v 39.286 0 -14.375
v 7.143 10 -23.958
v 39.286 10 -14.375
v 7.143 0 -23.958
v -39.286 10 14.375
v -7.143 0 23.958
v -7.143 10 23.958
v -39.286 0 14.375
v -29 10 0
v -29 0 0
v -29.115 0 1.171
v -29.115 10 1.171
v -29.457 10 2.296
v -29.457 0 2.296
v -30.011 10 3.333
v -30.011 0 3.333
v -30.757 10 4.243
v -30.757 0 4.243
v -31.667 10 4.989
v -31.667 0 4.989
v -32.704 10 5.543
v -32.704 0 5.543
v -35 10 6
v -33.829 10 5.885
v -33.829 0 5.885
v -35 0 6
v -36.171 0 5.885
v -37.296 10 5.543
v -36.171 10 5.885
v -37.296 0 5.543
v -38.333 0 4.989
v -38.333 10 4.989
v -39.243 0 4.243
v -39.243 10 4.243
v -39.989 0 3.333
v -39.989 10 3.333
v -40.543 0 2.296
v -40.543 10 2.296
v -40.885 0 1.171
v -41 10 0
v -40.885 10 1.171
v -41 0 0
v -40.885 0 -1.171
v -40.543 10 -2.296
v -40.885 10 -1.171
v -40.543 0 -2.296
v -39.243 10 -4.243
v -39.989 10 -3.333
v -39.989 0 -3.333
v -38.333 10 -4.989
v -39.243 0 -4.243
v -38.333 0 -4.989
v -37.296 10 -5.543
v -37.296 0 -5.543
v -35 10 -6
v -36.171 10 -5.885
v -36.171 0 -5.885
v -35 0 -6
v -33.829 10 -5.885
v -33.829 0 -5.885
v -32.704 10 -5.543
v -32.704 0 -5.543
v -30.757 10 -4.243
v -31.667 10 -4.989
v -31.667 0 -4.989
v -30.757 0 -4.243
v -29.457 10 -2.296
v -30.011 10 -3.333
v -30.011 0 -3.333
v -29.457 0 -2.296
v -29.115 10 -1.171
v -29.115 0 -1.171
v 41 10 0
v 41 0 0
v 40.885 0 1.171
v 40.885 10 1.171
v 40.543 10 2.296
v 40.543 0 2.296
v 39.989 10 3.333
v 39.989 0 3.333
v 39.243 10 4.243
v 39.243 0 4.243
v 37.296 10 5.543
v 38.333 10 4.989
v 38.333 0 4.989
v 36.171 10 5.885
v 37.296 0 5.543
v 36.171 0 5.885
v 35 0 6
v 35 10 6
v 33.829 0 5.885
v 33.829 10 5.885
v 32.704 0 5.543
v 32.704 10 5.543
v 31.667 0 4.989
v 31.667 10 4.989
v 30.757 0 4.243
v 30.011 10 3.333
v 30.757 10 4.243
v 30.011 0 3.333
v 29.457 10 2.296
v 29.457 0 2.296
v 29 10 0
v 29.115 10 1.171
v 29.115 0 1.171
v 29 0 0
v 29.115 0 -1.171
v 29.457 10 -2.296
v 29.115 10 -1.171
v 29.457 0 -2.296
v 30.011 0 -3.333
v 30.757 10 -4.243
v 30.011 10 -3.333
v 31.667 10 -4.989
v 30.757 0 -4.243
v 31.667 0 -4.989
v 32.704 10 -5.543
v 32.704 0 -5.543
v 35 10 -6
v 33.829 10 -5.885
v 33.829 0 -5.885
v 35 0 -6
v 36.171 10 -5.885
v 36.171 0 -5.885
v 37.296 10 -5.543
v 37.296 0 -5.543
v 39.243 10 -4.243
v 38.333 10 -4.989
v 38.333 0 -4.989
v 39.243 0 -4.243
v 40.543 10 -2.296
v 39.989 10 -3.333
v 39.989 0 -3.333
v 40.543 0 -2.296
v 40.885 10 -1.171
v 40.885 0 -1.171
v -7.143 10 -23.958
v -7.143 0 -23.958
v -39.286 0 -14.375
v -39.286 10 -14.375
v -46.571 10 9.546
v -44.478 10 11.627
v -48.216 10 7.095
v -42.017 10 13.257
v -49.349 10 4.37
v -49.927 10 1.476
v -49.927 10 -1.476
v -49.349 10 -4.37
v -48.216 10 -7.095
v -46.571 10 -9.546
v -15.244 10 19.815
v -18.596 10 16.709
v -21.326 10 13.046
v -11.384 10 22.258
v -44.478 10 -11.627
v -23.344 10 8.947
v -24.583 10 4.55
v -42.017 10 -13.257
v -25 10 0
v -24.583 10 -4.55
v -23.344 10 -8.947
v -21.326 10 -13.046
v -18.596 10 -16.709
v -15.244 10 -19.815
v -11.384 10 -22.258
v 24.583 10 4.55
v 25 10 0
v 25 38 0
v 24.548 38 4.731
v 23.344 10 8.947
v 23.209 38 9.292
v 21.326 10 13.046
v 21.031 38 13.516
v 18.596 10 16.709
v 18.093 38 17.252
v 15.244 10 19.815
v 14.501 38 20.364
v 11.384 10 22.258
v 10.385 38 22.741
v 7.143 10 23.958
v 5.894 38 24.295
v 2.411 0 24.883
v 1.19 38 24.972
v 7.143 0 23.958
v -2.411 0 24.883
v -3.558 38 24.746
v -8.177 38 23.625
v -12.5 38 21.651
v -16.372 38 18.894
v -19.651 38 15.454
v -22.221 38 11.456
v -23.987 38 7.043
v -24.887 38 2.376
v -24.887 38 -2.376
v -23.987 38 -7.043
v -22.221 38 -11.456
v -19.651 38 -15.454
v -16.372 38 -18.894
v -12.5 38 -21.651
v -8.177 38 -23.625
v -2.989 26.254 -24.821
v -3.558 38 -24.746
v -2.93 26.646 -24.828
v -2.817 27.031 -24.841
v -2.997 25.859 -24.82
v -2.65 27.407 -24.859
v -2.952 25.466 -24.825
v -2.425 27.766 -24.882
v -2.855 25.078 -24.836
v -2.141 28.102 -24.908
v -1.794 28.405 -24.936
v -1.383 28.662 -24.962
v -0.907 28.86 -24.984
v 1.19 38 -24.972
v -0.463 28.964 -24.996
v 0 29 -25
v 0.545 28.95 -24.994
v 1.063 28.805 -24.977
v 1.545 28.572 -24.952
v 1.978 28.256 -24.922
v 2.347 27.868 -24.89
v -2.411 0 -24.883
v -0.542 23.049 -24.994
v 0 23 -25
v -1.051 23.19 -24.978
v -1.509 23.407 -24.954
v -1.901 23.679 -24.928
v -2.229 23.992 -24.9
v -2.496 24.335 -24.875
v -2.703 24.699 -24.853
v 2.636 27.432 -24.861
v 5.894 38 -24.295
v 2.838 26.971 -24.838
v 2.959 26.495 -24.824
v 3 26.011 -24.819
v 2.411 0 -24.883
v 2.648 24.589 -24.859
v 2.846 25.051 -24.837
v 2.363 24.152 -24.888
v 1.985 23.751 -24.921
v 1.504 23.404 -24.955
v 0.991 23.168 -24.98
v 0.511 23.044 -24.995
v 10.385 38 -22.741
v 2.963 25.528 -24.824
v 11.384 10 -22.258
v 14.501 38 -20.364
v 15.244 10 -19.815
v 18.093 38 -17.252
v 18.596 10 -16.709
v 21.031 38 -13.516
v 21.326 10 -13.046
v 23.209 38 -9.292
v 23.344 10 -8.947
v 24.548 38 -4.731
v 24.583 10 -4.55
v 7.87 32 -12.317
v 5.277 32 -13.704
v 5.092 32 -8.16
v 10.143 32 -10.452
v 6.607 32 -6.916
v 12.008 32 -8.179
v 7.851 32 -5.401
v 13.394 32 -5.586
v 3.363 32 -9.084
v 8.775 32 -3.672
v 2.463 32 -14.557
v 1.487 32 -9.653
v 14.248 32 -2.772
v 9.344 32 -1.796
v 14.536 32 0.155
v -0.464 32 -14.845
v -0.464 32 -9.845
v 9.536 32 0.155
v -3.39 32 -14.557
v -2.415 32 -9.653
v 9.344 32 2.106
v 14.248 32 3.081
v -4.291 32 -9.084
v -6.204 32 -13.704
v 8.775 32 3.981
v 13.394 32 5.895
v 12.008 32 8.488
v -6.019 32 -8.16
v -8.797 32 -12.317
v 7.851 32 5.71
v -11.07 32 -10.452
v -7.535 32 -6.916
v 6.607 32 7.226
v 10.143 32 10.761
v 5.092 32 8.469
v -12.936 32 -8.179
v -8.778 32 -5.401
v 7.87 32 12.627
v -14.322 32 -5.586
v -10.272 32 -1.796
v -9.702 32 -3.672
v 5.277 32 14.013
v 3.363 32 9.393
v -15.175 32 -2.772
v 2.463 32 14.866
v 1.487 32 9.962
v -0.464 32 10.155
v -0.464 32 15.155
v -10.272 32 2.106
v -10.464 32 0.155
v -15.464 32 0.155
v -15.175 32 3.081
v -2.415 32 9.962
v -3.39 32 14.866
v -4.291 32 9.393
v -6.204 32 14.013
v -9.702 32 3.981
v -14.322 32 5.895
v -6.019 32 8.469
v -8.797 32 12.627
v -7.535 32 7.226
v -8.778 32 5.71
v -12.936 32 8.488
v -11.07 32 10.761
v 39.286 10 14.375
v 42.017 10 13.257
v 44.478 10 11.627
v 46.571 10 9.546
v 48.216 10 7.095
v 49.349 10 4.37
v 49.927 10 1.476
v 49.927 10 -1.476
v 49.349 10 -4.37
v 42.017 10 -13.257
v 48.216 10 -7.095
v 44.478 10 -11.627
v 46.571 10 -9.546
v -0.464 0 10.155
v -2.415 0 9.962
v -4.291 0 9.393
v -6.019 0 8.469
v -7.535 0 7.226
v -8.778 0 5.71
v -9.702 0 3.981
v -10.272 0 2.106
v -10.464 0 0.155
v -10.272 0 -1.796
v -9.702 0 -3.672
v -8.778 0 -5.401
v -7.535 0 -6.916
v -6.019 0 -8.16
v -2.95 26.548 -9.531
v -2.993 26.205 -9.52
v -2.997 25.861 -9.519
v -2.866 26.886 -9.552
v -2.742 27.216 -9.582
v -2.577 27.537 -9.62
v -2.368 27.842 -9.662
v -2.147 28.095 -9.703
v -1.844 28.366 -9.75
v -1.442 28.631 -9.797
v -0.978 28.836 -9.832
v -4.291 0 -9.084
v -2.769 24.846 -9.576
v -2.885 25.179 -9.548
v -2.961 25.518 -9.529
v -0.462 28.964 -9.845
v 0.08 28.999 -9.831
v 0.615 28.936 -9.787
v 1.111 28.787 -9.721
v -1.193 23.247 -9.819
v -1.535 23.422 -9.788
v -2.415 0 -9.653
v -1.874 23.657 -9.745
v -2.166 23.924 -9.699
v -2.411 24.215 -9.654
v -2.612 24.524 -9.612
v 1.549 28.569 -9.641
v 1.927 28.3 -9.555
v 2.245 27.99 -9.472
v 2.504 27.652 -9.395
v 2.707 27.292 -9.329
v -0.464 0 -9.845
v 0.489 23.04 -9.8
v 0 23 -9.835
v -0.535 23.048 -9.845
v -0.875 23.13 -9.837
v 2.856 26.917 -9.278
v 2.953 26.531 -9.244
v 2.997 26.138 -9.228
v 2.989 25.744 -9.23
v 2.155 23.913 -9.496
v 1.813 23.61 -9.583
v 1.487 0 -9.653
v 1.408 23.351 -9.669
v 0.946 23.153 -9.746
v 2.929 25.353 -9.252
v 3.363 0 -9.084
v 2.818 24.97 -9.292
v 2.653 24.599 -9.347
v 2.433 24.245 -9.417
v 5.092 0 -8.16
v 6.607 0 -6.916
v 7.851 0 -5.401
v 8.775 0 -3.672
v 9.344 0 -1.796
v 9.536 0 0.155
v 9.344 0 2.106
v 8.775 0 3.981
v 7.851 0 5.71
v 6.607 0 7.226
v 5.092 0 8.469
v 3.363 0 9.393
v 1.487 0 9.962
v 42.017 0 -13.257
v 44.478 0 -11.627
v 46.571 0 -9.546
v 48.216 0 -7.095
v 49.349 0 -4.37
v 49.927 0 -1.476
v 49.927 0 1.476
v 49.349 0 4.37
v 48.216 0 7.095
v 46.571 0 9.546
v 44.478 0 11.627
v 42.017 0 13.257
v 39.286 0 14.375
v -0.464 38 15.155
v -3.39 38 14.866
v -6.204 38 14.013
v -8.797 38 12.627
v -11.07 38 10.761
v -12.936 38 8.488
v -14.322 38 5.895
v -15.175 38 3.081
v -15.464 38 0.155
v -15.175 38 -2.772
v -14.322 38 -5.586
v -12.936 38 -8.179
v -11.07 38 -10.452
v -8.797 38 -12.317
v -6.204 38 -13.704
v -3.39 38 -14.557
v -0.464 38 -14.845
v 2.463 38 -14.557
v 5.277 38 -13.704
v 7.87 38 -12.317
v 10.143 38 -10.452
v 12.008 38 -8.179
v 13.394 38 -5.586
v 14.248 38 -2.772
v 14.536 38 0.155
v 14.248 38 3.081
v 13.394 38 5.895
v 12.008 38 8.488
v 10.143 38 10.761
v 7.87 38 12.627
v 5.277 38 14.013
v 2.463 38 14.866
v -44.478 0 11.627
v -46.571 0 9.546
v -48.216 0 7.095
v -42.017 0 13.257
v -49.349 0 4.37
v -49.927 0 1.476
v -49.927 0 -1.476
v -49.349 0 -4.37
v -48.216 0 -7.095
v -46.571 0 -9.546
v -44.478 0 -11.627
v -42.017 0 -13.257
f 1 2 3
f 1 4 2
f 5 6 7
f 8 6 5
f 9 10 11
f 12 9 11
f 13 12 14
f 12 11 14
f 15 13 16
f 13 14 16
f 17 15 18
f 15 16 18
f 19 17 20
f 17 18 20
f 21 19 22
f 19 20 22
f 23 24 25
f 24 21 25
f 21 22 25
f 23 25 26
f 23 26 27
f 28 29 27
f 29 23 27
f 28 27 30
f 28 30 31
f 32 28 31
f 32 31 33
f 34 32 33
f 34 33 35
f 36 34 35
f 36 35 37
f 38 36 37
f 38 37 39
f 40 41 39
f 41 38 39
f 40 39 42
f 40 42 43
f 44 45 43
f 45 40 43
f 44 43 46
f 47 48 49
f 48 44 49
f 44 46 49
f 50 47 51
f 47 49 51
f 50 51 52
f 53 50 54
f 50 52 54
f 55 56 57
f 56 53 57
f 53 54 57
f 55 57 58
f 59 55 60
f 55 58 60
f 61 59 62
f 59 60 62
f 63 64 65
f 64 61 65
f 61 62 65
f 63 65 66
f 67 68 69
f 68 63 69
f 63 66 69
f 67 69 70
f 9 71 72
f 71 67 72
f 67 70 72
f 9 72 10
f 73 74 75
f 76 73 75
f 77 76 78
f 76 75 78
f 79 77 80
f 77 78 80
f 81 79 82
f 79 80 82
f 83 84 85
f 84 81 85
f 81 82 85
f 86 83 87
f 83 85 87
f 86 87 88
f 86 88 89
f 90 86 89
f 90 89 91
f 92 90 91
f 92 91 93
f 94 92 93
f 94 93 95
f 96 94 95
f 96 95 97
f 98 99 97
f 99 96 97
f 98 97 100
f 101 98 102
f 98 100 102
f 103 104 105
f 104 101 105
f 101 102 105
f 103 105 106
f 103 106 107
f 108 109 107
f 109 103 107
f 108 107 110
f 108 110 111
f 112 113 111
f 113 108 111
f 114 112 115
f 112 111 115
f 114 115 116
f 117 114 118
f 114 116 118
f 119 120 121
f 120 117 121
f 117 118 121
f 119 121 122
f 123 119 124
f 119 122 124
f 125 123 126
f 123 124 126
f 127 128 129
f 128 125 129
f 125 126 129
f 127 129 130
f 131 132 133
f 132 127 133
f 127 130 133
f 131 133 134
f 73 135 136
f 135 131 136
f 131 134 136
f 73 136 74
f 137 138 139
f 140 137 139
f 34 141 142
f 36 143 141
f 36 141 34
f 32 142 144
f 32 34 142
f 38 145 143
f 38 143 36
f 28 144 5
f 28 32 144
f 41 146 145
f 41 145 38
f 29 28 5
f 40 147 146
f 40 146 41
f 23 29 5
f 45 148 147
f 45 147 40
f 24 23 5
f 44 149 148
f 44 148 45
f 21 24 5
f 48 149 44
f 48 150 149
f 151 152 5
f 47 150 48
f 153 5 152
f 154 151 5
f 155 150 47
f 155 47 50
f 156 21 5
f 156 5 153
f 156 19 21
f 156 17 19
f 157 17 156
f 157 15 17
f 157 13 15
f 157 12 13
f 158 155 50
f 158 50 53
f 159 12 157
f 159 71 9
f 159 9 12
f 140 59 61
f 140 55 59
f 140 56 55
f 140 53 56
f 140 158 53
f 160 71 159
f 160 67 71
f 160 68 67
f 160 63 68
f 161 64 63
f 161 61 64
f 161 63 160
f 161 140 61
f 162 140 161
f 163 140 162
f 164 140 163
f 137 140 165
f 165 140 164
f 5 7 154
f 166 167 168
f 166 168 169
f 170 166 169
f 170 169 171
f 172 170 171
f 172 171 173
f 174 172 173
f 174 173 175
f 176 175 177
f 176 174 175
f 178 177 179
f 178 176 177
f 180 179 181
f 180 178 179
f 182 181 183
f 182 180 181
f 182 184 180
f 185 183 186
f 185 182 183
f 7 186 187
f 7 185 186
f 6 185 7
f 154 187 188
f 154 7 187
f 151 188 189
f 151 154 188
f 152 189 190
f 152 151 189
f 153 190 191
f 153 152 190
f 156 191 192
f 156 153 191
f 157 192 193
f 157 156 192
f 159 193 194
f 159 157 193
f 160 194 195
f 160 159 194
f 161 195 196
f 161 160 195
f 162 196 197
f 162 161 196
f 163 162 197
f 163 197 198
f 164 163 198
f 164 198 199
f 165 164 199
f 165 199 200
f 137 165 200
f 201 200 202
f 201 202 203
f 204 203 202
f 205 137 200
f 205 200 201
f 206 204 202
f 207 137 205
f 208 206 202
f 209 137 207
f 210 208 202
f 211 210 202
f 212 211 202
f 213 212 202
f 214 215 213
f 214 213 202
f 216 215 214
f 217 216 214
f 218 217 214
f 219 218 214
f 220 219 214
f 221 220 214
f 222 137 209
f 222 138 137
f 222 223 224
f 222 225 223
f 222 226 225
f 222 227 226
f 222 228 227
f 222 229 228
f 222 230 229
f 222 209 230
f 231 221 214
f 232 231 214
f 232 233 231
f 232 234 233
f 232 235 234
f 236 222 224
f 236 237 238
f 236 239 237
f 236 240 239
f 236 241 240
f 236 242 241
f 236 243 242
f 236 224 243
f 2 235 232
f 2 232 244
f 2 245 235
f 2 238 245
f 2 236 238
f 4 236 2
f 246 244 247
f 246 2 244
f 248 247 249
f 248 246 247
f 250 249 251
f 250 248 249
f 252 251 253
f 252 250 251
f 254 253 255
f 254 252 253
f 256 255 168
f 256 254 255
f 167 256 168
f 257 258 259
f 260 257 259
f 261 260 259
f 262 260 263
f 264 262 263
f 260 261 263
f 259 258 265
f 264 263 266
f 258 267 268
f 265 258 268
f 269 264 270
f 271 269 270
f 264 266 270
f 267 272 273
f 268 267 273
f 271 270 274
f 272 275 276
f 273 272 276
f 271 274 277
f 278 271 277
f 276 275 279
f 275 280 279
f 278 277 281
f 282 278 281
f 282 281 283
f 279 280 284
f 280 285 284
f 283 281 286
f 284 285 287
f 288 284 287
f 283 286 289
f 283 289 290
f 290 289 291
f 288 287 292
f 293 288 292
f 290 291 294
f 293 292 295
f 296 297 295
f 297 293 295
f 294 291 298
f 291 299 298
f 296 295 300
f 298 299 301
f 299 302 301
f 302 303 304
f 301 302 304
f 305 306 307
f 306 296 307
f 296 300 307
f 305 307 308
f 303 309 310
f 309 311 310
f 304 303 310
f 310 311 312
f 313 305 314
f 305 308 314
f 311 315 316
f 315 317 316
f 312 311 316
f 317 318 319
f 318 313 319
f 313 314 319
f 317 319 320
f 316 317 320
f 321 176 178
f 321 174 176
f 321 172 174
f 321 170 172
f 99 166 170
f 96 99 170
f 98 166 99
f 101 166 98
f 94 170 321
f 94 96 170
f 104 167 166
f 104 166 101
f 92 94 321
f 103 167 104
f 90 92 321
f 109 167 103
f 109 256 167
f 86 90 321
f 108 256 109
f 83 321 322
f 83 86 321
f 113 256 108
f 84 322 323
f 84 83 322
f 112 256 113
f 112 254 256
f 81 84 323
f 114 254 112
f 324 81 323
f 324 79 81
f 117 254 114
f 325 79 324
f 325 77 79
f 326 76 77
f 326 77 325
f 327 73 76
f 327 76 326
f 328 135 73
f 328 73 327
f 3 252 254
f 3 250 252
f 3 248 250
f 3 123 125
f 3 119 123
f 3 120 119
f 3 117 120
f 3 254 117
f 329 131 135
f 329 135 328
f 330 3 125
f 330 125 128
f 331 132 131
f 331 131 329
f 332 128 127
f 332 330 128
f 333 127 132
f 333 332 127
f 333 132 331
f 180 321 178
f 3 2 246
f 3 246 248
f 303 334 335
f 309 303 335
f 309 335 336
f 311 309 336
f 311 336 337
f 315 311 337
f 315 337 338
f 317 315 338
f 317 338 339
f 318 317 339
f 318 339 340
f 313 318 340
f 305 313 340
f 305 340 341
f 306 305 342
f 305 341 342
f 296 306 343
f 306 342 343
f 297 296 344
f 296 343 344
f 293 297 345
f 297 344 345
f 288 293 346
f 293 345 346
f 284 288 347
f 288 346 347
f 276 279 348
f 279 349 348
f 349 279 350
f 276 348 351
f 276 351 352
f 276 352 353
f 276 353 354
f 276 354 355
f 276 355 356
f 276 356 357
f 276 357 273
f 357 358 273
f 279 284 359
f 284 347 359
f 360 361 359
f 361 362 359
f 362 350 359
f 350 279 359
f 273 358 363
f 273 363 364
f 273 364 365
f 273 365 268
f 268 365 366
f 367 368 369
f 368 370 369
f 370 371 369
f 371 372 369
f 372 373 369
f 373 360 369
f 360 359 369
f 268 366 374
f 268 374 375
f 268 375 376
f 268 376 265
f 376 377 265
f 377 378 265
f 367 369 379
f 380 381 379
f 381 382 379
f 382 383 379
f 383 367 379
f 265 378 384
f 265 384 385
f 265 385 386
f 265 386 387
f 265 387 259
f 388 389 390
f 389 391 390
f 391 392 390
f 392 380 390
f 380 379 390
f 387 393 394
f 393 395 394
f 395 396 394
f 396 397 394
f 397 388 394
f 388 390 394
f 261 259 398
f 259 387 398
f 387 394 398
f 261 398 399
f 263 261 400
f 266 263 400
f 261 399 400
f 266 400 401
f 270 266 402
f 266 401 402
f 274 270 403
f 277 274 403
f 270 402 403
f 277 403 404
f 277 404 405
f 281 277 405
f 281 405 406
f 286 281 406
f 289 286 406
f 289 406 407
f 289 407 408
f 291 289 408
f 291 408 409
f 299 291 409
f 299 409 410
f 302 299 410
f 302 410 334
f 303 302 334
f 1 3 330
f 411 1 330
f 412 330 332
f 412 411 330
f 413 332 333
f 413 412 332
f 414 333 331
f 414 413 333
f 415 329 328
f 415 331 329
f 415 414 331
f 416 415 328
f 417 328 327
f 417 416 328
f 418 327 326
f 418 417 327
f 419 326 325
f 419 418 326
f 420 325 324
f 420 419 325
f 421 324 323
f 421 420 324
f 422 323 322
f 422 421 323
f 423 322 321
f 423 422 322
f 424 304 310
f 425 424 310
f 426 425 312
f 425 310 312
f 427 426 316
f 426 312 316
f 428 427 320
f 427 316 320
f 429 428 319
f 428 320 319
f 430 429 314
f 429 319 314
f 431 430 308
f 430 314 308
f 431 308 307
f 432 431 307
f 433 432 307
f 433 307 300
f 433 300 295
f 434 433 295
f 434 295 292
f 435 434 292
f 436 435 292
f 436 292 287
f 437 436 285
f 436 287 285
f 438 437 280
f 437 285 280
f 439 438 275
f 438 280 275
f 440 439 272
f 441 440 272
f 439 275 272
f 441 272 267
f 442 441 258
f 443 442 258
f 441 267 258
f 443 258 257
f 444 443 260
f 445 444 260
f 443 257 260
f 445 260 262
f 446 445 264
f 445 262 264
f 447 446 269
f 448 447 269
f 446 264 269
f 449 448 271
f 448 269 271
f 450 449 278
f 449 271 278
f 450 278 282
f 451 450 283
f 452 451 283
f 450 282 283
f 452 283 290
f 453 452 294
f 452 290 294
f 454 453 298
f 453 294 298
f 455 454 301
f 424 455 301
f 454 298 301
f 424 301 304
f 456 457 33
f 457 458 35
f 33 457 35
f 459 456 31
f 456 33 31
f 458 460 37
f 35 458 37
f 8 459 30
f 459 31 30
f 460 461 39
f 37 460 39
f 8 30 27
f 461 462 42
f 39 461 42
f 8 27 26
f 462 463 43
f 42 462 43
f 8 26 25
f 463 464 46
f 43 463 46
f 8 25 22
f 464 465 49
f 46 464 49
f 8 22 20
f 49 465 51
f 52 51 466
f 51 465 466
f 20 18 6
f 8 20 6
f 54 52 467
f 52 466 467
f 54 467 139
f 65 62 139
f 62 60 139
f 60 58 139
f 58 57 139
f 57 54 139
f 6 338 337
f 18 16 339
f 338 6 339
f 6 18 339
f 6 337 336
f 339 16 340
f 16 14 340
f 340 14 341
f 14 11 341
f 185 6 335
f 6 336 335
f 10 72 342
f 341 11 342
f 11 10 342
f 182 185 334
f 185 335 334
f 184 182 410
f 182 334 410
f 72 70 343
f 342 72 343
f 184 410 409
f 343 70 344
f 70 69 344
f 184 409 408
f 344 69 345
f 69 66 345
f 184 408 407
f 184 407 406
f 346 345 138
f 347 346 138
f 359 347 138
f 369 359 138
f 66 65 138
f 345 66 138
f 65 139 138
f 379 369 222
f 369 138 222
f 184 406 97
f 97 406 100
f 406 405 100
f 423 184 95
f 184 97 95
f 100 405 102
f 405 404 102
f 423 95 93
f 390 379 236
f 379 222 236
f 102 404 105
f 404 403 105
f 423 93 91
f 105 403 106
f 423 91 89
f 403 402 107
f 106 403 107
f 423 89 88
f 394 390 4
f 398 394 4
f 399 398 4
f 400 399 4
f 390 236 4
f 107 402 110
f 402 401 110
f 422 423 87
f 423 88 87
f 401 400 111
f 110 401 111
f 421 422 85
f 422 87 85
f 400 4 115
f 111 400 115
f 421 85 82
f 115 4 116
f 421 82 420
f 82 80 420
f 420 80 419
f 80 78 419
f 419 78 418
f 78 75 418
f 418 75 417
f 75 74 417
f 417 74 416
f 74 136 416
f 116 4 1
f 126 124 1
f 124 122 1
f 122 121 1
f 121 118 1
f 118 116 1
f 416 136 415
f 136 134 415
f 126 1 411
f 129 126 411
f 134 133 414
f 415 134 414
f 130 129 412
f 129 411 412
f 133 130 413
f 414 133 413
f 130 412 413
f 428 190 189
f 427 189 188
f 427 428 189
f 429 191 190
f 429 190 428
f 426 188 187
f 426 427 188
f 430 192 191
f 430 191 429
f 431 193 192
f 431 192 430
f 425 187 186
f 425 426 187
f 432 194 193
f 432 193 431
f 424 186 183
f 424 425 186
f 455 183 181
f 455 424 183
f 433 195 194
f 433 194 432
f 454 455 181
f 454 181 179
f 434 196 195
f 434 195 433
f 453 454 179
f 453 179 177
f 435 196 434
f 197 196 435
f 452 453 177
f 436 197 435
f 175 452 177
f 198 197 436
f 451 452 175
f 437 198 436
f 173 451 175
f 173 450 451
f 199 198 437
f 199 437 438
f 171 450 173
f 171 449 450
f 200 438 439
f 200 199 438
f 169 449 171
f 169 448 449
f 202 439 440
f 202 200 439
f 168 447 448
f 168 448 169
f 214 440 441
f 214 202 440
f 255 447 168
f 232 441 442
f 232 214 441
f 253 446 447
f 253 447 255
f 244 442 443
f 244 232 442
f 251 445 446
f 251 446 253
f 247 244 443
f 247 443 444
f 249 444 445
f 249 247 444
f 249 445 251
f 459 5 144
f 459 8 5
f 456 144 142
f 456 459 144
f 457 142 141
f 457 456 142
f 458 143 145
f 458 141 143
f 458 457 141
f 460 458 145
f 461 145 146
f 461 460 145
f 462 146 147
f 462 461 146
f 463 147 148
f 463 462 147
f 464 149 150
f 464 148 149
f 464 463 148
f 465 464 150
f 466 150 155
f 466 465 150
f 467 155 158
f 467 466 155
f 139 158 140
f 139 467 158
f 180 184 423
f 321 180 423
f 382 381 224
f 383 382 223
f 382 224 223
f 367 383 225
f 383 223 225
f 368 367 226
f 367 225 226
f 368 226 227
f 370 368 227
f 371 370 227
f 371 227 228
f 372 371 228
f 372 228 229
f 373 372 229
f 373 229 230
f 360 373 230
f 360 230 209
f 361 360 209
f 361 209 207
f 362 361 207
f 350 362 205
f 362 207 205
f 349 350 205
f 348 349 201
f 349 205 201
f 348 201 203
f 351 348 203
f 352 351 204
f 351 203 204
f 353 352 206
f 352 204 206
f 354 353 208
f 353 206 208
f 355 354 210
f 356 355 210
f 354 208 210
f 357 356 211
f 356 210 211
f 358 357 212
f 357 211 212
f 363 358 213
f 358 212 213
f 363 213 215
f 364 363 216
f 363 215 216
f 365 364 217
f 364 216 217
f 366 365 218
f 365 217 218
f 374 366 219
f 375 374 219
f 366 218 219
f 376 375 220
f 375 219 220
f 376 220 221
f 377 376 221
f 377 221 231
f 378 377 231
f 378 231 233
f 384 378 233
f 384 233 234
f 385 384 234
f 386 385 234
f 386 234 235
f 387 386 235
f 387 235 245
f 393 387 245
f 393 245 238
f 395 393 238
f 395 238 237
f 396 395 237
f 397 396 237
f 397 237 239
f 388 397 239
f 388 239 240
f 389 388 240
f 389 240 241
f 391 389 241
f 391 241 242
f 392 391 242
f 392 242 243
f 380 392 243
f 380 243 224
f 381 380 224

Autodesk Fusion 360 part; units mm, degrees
sketch "Sketch1" plane through (0, 0, 0) normal (0, 1, 0) x (1, 0, 0)
  circle A0 centre (0, 0) radius 25
  line L0 (20, 0) -> (35, 0)
  line L1 (7.1429, -23.9579) -> (39.2857, -14.3747)
  line L2 (-2.1697, 26.7343) -> (39.2857, 14.3747)
  arc A1 (39.2857, -14.3747) -> (39.2857, 14.3747) centre (35, 0) ccw
  line L3 (0, -63.6354) -> (0, 71.5668)
  line L4 (-7.1429, -23.9579) -> (-39.2857, -14.3747)
  arc A2 (-39.2857, 14.3747) -> (-39.2857, -14.3747) centre (-35, 0) ccw
  line L5 (2.1697, 26.7343) -> (-39.2857, 14.3747)
  circle A3 centre (0, 0) radius 25
  circle A4 centre (-35, 0) radius 6
  circle A5 centre (35, 0) radius 6
  dimension "d1" = 50
  dimension "d2" = 35
  dimension "d3" = 30
  dimension "d4" = 12
  dimension "d5" = 12
extrude "Extrude1" add sketch "Sketch1" along normal blind 10 contours A0 L1 L2 A1 A3 | A0 L4 A2 L5 A3 makes body 1 at (31.6163, 0, 10.1046) makes body 2 at (-31.6163, 0, -10.1046)
sketch "Sketch2" plane through (0, 0, 0) normal (0, 1, 0) x (1, 0, 0)
  circle A0 centre (0, 0) radius 25
  circle A1 centre (0, 0) radius 25
  dimension "d8" = 50
  dimension "d9" = 50
extrude "Extrude2" add sketch "Sketch2" along normal blind 38 bodies 1 2
hole "Hole1" at (-0.4637, 38, 0.1546) direction (0, -1, 0) diameter 20 depth 38 tip angle 180 counterbore diameter 30 counterbore depth 6 bodies 1
sketch "Sketch3" plane through (0, 0, 0) normal (0, 0, 1) x (1, 0, 0)
  line L0 (0, 0) -> (0, 26)
  dimension "d17" = 26
hole "Hole2" at (0, 26, 0) direction (0, 0, -1) diameter 6 depth 25 tip angle 180 bodies 1
